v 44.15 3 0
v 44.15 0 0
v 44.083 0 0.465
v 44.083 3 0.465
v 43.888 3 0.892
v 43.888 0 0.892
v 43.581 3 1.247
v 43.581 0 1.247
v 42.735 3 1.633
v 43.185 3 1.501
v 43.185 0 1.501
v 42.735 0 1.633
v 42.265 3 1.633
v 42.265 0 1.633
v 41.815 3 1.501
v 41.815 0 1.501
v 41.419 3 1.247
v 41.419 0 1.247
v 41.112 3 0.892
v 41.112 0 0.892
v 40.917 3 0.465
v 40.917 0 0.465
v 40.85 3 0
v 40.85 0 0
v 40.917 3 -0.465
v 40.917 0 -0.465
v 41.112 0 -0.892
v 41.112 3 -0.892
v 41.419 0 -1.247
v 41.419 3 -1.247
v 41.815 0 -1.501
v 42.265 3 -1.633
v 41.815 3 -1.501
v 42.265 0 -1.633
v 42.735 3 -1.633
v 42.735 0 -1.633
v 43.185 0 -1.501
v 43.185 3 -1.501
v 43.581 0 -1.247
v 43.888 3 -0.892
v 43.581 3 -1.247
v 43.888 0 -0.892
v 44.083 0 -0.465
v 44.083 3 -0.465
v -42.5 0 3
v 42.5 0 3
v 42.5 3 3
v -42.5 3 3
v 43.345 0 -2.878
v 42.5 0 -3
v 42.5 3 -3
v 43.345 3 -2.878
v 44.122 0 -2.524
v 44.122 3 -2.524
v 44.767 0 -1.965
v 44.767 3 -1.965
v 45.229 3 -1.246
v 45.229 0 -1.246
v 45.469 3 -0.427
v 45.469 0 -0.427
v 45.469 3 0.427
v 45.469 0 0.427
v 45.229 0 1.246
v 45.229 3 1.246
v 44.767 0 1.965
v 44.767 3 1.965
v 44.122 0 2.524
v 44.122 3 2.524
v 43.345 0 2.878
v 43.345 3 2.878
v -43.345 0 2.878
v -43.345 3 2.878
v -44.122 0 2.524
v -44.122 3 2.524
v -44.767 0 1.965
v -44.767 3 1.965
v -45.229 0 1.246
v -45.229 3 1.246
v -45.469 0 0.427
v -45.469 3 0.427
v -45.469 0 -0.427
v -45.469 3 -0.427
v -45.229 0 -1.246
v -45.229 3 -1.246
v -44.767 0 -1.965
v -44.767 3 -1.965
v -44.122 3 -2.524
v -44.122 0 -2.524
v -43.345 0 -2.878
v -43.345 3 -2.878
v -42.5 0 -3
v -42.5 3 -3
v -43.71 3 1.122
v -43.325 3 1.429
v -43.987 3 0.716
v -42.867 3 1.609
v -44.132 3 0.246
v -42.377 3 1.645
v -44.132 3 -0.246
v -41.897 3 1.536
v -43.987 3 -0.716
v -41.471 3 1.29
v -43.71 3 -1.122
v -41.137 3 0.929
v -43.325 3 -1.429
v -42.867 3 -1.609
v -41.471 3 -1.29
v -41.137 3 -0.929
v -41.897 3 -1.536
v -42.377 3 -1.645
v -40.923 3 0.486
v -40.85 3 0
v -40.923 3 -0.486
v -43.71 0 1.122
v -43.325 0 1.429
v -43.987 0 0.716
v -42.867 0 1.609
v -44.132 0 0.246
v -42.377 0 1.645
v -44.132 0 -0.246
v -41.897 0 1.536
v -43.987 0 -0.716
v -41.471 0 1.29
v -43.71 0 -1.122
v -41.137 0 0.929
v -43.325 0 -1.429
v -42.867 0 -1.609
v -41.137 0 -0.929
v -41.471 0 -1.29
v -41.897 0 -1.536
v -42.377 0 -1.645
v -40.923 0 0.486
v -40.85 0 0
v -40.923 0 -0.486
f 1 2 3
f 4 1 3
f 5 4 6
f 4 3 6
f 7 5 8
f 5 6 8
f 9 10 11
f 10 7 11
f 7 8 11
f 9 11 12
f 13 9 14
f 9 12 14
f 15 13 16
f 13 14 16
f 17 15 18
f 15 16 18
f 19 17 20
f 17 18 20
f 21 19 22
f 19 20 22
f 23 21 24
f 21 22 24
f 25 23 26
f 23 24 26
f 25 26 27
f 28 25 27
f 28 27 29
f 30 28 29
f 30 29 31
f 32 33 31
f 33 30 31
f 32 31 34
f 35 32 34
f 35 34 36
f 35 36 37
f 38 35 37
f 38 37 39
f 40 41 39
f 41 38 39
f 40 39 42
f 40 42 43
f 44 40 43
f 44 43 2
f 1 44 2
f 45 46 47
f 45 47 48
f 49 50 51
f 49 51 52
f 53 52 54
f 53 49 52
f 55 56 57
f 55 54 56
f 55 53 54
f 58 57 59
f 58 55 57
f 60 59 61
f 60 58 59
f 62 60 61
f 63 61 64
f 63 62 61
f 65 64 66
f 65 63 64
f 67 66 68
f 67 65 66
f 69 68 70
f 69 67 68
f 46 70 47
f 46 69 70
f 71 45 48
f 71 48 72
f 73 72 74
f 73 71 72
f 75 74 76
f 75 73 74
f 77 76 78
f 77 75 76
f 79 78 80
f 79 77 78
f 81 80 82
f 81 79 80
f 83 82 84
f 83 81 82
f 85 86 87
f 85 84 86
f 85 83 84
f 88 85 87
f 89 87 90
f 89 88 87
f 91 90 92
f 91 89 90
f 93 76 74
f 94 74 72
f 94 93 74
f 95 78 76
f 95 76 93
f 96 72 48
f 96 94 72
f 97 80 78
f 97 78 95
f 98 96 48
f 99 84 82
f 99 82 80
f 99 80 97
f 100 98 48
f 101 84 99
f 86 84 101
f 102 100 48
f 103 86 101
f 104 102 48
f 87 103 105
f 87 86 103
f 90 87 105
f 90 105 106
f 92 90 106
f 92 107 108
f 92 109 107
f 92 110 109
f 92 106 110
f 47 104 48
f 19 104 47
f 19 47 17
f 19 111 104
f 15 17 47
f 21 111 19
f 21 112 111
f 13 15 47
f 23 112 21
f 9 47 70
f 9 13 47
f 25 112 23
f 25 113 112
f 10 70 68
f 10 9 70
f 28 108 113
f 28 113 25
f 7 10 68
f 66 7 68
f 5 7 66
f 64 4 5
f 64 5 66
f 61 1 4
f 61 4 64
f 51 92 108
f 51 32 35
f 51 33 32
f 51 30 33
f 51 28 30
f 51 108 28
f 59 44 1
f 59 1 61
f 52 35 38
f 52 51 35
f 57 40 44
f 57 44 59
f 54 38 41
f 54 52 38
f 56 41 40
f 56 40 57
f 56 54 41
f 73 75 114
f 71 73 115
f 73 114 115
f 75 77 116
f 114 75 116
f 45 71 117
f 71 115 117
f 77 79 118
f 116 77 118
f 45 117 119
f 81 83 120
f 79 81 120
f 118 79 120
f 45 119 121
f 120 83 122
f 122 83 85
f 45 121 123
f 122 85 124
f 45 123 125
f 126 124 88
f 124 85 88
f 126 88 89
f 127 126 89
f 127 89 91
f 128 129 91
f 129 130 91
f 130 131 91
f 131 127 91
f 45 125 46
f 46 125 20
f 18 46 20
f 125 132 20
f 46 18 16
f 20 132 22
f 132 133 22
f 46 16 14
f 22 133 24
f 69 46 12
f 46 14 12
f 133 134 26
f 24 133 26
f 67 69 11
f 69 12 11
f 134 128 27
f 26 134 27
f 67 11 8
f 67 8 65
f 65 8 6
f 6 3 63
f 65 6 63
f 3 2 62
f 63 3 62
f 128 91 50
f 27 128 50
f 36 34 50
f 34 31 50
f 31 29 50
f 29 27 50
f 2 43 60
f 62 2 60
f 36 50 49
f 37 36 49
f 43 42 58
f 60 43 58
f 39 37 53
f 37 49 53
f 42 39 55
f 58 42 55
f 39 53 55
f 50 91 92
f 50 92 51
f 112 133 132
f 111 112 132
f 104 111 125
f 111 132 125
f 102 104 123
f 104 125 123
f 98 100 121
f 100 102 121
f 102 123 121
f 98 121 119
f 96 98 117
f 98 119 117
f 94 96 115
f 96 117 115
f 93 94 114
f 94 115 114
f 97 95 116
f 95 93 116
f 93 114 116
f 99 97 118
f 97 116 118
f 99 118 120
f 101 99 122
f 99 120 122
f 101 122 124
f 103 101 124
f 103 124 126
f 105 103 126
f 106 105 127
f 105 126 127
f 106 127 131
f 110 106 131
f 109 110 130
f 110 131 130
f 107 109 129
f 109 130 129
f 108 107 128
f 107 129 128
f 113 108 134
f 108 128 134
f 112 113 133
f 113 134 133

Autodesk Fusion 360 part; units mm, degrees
sketch "Sketch1" plane through (0, 0, 0) normal (0, 1, 0) x (1, 0, 0)
  line L0 (-42.5, 0) -> (42.5, 0)
  line L1 (-42.5, 3) -> (42.5, 3)
  line L2 (42.5, -3) -> (-42.5, -3)
  circle A0 centre (-42.5, 0) radius 1.65
  circle A1 centre (-42.5, 0) radius 3
  circle A2 centre (42.5, 0) radius 3
  circle A3 centre (42.5, 0) radius 1.65
  dimension "d1" = 85
  dimension "d8" = 3.3
  dimension "d9" = 6
  dimension "d10" = 3.3
extrude "Extrude1" add sketch "Sketch1" along normal blind 3
